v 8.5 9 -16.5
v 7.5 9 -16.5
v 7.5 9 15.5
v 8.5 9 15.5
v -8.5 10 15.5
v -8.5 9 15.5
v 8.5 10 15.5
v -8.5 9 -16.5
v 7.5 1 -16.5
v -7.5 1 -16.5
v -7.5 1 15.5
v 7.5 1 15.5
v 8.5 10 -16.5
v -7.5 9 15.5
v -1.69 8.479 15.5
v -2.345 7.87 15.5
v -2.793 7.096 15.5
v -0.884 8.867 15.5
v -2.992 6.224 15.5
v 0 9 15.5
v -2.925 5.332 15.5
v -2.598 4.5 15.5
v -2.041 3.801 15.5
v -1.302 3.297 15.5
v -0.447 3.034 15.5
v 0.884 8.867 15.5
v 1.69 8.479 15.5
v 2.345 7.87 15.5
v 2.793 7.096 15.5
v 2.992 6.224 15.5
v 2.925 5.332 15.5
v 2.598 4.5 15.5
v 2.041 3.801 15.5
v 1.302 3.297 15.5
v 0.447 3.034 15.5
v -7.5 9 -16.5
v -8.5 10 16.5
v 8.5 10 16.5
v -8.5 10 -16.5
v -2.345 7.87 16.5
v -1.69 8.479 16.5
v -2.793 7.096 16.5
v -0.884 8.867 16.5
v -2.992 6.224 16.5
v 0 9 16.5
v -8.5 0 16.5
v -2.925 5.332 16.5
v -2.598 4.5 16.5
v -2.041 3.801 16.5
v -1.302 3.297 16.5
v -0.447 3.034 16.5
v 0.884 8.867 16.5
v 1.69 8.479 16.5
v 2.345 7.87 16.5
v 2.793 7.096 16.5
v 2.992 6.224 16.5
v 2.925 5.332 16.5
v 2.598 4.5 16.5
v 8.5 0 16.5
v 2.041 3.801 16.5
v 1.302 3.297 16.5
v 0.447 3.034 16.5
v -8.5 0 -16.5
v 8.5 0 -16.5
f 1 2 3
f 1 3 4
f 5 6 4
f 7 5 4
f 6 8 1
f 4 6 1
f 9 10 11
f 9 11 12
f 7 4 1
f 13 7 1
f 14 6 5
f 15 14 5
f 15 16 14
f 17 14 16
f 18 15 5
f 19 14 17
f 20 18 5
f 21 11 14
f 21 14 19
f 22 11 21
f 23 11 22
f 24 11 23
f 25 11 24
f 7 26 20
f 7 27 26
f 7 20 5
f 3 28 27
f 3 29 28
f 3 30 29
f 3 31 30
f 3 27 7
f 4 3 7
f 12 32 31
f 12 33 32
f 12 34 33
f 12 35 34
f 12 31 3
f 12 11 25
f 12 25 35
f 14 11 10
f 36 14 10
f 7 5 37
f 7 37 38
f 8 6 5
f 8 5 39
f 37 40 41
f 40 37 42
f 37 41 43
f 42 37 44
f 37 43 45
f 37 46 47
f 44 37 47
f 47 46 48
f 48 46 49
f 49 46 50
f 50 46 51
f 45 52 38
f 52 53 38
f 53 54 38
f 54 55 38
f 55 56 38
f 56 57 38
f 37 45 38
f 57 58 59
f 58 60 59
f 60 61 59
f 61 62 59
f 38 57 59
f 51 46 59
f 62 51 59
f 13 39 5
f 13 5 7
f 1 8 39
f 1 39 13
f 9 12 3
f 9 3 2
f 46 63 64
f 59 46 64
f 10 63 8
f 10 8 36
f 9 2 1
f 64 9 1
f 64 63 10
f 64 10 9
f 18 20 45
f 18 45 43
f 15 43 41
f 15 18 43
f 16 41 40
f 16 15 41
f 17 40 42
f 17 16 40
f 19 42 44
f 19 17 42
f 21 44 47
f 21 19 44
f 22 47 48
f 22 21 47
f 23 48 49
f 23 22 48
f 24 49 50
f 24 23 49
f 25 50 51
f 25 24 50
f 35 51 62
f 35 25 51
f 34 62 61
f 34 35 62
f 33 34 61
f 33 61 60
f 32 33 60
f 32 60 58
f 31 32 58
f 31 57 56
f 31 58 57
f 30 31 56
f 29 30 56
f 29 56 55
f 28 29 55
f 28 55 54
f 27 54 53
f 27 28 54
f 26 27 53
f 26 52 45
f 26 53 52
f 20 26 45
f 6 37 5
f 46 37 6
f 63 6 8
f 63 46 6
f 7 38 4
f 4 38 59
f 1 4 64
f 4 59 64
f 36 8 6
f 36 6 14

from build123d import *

# Parameters (mm, degrees)
SKETCH_1_W          = 17
SKETCH_1_H          = 33
EXTRUDE_1_DEPTH     = 10
CUT_EXTRUDE_START   = 1
SKETCH_2_W          = 15
SKETCH_2_H          = 32
CUT_EXTRUDE_1_DEPTH = 8
SKETCH_3_R          = 3
CUT_EXTRUDE_2_DEPTH = 22.083168642
CUT_EXTRUDE_START_2 = 9
SKETCH_5_W          = 17
SKETCH_5_H          = 32
CUT_EXTRUDE_3_DEPTH = 8
EXTRUDE_START       = 9
SKETCH_6_W          = 17
SKETCH_6_H          = 32
EXTRUDE_2_DEPTH     = 1


with BuildPart() as part:
    # 스케치1 → 보스-돌출1 (new body)
    with BuildSketch(Plane(origin=(0, 0, 0), x_dir=(1, 0, 0), z_dir=(0, 1, 0))):
        Rectangle(SKETCH_1_W, SKETCH_1_H)
    extrude(amount=EXTRUDE_1_DEPTH)

    # 스케치2 → 컷-돌출1 (cut)
    with BuildSketch(Plane(origin=(0, 0, 0), x_dir=(1, 0, 0), z_dir=(0, 1, 0)).offset(CUT_EXTRUDE_START)):
        with Locations((0, 0.5)):
            Rectangle(SKETCH_2_W, SKETCH_2_H)
    extrude(amount=CUT_EXTRUDE_1_DEPTH, mode=Mode.SUBTRACT)

    # 스케치3 → 컷-돌출2 (cut, through all)
    with BuildSketch(Plane.XY):
        with Locations(Location((0, 6, 0), (0, 0, 90))):
            Circle(SKETCH_3_R)
    extrude(amount=CUT_EXTRUDE_2_DEPTH, mode=Mode.SUBTRACT)

    # 스케치5 → 컷-돌출3 (cut)
    with BuildSketch(Plane(origin=(0, 0, 0), x_dir=(1, 0, 0), z_dir=(0, 1, 0)).offset(CUT_EXTRUDE_START_2)):
        with Locations((0, 0.5)):
            Rectangle(SKETCH_5_W, SKETCH_5_H)
    extrude(amount=CUT_EXTRUDE_3_DEPTH, mode=Mode.SUBTRACT)


with BuildPart() as body_2:
    # 스케치6 → 보스-돌출2 (new body)
    with BuildSketch(Plane(origin=(0, 0, 0), x_dir=(1, 0, 0), z_dir=(0, 1, 0)).offset(EXTRUDE_START)):
        with Locations((0, 0.5)):
            Rectangle(SKETCH_6_W, SKETCH_6_H)
    extrude(amount=EXTRUDE_2_DEPTH)


solid = Compound([part.part, body_2.part])
